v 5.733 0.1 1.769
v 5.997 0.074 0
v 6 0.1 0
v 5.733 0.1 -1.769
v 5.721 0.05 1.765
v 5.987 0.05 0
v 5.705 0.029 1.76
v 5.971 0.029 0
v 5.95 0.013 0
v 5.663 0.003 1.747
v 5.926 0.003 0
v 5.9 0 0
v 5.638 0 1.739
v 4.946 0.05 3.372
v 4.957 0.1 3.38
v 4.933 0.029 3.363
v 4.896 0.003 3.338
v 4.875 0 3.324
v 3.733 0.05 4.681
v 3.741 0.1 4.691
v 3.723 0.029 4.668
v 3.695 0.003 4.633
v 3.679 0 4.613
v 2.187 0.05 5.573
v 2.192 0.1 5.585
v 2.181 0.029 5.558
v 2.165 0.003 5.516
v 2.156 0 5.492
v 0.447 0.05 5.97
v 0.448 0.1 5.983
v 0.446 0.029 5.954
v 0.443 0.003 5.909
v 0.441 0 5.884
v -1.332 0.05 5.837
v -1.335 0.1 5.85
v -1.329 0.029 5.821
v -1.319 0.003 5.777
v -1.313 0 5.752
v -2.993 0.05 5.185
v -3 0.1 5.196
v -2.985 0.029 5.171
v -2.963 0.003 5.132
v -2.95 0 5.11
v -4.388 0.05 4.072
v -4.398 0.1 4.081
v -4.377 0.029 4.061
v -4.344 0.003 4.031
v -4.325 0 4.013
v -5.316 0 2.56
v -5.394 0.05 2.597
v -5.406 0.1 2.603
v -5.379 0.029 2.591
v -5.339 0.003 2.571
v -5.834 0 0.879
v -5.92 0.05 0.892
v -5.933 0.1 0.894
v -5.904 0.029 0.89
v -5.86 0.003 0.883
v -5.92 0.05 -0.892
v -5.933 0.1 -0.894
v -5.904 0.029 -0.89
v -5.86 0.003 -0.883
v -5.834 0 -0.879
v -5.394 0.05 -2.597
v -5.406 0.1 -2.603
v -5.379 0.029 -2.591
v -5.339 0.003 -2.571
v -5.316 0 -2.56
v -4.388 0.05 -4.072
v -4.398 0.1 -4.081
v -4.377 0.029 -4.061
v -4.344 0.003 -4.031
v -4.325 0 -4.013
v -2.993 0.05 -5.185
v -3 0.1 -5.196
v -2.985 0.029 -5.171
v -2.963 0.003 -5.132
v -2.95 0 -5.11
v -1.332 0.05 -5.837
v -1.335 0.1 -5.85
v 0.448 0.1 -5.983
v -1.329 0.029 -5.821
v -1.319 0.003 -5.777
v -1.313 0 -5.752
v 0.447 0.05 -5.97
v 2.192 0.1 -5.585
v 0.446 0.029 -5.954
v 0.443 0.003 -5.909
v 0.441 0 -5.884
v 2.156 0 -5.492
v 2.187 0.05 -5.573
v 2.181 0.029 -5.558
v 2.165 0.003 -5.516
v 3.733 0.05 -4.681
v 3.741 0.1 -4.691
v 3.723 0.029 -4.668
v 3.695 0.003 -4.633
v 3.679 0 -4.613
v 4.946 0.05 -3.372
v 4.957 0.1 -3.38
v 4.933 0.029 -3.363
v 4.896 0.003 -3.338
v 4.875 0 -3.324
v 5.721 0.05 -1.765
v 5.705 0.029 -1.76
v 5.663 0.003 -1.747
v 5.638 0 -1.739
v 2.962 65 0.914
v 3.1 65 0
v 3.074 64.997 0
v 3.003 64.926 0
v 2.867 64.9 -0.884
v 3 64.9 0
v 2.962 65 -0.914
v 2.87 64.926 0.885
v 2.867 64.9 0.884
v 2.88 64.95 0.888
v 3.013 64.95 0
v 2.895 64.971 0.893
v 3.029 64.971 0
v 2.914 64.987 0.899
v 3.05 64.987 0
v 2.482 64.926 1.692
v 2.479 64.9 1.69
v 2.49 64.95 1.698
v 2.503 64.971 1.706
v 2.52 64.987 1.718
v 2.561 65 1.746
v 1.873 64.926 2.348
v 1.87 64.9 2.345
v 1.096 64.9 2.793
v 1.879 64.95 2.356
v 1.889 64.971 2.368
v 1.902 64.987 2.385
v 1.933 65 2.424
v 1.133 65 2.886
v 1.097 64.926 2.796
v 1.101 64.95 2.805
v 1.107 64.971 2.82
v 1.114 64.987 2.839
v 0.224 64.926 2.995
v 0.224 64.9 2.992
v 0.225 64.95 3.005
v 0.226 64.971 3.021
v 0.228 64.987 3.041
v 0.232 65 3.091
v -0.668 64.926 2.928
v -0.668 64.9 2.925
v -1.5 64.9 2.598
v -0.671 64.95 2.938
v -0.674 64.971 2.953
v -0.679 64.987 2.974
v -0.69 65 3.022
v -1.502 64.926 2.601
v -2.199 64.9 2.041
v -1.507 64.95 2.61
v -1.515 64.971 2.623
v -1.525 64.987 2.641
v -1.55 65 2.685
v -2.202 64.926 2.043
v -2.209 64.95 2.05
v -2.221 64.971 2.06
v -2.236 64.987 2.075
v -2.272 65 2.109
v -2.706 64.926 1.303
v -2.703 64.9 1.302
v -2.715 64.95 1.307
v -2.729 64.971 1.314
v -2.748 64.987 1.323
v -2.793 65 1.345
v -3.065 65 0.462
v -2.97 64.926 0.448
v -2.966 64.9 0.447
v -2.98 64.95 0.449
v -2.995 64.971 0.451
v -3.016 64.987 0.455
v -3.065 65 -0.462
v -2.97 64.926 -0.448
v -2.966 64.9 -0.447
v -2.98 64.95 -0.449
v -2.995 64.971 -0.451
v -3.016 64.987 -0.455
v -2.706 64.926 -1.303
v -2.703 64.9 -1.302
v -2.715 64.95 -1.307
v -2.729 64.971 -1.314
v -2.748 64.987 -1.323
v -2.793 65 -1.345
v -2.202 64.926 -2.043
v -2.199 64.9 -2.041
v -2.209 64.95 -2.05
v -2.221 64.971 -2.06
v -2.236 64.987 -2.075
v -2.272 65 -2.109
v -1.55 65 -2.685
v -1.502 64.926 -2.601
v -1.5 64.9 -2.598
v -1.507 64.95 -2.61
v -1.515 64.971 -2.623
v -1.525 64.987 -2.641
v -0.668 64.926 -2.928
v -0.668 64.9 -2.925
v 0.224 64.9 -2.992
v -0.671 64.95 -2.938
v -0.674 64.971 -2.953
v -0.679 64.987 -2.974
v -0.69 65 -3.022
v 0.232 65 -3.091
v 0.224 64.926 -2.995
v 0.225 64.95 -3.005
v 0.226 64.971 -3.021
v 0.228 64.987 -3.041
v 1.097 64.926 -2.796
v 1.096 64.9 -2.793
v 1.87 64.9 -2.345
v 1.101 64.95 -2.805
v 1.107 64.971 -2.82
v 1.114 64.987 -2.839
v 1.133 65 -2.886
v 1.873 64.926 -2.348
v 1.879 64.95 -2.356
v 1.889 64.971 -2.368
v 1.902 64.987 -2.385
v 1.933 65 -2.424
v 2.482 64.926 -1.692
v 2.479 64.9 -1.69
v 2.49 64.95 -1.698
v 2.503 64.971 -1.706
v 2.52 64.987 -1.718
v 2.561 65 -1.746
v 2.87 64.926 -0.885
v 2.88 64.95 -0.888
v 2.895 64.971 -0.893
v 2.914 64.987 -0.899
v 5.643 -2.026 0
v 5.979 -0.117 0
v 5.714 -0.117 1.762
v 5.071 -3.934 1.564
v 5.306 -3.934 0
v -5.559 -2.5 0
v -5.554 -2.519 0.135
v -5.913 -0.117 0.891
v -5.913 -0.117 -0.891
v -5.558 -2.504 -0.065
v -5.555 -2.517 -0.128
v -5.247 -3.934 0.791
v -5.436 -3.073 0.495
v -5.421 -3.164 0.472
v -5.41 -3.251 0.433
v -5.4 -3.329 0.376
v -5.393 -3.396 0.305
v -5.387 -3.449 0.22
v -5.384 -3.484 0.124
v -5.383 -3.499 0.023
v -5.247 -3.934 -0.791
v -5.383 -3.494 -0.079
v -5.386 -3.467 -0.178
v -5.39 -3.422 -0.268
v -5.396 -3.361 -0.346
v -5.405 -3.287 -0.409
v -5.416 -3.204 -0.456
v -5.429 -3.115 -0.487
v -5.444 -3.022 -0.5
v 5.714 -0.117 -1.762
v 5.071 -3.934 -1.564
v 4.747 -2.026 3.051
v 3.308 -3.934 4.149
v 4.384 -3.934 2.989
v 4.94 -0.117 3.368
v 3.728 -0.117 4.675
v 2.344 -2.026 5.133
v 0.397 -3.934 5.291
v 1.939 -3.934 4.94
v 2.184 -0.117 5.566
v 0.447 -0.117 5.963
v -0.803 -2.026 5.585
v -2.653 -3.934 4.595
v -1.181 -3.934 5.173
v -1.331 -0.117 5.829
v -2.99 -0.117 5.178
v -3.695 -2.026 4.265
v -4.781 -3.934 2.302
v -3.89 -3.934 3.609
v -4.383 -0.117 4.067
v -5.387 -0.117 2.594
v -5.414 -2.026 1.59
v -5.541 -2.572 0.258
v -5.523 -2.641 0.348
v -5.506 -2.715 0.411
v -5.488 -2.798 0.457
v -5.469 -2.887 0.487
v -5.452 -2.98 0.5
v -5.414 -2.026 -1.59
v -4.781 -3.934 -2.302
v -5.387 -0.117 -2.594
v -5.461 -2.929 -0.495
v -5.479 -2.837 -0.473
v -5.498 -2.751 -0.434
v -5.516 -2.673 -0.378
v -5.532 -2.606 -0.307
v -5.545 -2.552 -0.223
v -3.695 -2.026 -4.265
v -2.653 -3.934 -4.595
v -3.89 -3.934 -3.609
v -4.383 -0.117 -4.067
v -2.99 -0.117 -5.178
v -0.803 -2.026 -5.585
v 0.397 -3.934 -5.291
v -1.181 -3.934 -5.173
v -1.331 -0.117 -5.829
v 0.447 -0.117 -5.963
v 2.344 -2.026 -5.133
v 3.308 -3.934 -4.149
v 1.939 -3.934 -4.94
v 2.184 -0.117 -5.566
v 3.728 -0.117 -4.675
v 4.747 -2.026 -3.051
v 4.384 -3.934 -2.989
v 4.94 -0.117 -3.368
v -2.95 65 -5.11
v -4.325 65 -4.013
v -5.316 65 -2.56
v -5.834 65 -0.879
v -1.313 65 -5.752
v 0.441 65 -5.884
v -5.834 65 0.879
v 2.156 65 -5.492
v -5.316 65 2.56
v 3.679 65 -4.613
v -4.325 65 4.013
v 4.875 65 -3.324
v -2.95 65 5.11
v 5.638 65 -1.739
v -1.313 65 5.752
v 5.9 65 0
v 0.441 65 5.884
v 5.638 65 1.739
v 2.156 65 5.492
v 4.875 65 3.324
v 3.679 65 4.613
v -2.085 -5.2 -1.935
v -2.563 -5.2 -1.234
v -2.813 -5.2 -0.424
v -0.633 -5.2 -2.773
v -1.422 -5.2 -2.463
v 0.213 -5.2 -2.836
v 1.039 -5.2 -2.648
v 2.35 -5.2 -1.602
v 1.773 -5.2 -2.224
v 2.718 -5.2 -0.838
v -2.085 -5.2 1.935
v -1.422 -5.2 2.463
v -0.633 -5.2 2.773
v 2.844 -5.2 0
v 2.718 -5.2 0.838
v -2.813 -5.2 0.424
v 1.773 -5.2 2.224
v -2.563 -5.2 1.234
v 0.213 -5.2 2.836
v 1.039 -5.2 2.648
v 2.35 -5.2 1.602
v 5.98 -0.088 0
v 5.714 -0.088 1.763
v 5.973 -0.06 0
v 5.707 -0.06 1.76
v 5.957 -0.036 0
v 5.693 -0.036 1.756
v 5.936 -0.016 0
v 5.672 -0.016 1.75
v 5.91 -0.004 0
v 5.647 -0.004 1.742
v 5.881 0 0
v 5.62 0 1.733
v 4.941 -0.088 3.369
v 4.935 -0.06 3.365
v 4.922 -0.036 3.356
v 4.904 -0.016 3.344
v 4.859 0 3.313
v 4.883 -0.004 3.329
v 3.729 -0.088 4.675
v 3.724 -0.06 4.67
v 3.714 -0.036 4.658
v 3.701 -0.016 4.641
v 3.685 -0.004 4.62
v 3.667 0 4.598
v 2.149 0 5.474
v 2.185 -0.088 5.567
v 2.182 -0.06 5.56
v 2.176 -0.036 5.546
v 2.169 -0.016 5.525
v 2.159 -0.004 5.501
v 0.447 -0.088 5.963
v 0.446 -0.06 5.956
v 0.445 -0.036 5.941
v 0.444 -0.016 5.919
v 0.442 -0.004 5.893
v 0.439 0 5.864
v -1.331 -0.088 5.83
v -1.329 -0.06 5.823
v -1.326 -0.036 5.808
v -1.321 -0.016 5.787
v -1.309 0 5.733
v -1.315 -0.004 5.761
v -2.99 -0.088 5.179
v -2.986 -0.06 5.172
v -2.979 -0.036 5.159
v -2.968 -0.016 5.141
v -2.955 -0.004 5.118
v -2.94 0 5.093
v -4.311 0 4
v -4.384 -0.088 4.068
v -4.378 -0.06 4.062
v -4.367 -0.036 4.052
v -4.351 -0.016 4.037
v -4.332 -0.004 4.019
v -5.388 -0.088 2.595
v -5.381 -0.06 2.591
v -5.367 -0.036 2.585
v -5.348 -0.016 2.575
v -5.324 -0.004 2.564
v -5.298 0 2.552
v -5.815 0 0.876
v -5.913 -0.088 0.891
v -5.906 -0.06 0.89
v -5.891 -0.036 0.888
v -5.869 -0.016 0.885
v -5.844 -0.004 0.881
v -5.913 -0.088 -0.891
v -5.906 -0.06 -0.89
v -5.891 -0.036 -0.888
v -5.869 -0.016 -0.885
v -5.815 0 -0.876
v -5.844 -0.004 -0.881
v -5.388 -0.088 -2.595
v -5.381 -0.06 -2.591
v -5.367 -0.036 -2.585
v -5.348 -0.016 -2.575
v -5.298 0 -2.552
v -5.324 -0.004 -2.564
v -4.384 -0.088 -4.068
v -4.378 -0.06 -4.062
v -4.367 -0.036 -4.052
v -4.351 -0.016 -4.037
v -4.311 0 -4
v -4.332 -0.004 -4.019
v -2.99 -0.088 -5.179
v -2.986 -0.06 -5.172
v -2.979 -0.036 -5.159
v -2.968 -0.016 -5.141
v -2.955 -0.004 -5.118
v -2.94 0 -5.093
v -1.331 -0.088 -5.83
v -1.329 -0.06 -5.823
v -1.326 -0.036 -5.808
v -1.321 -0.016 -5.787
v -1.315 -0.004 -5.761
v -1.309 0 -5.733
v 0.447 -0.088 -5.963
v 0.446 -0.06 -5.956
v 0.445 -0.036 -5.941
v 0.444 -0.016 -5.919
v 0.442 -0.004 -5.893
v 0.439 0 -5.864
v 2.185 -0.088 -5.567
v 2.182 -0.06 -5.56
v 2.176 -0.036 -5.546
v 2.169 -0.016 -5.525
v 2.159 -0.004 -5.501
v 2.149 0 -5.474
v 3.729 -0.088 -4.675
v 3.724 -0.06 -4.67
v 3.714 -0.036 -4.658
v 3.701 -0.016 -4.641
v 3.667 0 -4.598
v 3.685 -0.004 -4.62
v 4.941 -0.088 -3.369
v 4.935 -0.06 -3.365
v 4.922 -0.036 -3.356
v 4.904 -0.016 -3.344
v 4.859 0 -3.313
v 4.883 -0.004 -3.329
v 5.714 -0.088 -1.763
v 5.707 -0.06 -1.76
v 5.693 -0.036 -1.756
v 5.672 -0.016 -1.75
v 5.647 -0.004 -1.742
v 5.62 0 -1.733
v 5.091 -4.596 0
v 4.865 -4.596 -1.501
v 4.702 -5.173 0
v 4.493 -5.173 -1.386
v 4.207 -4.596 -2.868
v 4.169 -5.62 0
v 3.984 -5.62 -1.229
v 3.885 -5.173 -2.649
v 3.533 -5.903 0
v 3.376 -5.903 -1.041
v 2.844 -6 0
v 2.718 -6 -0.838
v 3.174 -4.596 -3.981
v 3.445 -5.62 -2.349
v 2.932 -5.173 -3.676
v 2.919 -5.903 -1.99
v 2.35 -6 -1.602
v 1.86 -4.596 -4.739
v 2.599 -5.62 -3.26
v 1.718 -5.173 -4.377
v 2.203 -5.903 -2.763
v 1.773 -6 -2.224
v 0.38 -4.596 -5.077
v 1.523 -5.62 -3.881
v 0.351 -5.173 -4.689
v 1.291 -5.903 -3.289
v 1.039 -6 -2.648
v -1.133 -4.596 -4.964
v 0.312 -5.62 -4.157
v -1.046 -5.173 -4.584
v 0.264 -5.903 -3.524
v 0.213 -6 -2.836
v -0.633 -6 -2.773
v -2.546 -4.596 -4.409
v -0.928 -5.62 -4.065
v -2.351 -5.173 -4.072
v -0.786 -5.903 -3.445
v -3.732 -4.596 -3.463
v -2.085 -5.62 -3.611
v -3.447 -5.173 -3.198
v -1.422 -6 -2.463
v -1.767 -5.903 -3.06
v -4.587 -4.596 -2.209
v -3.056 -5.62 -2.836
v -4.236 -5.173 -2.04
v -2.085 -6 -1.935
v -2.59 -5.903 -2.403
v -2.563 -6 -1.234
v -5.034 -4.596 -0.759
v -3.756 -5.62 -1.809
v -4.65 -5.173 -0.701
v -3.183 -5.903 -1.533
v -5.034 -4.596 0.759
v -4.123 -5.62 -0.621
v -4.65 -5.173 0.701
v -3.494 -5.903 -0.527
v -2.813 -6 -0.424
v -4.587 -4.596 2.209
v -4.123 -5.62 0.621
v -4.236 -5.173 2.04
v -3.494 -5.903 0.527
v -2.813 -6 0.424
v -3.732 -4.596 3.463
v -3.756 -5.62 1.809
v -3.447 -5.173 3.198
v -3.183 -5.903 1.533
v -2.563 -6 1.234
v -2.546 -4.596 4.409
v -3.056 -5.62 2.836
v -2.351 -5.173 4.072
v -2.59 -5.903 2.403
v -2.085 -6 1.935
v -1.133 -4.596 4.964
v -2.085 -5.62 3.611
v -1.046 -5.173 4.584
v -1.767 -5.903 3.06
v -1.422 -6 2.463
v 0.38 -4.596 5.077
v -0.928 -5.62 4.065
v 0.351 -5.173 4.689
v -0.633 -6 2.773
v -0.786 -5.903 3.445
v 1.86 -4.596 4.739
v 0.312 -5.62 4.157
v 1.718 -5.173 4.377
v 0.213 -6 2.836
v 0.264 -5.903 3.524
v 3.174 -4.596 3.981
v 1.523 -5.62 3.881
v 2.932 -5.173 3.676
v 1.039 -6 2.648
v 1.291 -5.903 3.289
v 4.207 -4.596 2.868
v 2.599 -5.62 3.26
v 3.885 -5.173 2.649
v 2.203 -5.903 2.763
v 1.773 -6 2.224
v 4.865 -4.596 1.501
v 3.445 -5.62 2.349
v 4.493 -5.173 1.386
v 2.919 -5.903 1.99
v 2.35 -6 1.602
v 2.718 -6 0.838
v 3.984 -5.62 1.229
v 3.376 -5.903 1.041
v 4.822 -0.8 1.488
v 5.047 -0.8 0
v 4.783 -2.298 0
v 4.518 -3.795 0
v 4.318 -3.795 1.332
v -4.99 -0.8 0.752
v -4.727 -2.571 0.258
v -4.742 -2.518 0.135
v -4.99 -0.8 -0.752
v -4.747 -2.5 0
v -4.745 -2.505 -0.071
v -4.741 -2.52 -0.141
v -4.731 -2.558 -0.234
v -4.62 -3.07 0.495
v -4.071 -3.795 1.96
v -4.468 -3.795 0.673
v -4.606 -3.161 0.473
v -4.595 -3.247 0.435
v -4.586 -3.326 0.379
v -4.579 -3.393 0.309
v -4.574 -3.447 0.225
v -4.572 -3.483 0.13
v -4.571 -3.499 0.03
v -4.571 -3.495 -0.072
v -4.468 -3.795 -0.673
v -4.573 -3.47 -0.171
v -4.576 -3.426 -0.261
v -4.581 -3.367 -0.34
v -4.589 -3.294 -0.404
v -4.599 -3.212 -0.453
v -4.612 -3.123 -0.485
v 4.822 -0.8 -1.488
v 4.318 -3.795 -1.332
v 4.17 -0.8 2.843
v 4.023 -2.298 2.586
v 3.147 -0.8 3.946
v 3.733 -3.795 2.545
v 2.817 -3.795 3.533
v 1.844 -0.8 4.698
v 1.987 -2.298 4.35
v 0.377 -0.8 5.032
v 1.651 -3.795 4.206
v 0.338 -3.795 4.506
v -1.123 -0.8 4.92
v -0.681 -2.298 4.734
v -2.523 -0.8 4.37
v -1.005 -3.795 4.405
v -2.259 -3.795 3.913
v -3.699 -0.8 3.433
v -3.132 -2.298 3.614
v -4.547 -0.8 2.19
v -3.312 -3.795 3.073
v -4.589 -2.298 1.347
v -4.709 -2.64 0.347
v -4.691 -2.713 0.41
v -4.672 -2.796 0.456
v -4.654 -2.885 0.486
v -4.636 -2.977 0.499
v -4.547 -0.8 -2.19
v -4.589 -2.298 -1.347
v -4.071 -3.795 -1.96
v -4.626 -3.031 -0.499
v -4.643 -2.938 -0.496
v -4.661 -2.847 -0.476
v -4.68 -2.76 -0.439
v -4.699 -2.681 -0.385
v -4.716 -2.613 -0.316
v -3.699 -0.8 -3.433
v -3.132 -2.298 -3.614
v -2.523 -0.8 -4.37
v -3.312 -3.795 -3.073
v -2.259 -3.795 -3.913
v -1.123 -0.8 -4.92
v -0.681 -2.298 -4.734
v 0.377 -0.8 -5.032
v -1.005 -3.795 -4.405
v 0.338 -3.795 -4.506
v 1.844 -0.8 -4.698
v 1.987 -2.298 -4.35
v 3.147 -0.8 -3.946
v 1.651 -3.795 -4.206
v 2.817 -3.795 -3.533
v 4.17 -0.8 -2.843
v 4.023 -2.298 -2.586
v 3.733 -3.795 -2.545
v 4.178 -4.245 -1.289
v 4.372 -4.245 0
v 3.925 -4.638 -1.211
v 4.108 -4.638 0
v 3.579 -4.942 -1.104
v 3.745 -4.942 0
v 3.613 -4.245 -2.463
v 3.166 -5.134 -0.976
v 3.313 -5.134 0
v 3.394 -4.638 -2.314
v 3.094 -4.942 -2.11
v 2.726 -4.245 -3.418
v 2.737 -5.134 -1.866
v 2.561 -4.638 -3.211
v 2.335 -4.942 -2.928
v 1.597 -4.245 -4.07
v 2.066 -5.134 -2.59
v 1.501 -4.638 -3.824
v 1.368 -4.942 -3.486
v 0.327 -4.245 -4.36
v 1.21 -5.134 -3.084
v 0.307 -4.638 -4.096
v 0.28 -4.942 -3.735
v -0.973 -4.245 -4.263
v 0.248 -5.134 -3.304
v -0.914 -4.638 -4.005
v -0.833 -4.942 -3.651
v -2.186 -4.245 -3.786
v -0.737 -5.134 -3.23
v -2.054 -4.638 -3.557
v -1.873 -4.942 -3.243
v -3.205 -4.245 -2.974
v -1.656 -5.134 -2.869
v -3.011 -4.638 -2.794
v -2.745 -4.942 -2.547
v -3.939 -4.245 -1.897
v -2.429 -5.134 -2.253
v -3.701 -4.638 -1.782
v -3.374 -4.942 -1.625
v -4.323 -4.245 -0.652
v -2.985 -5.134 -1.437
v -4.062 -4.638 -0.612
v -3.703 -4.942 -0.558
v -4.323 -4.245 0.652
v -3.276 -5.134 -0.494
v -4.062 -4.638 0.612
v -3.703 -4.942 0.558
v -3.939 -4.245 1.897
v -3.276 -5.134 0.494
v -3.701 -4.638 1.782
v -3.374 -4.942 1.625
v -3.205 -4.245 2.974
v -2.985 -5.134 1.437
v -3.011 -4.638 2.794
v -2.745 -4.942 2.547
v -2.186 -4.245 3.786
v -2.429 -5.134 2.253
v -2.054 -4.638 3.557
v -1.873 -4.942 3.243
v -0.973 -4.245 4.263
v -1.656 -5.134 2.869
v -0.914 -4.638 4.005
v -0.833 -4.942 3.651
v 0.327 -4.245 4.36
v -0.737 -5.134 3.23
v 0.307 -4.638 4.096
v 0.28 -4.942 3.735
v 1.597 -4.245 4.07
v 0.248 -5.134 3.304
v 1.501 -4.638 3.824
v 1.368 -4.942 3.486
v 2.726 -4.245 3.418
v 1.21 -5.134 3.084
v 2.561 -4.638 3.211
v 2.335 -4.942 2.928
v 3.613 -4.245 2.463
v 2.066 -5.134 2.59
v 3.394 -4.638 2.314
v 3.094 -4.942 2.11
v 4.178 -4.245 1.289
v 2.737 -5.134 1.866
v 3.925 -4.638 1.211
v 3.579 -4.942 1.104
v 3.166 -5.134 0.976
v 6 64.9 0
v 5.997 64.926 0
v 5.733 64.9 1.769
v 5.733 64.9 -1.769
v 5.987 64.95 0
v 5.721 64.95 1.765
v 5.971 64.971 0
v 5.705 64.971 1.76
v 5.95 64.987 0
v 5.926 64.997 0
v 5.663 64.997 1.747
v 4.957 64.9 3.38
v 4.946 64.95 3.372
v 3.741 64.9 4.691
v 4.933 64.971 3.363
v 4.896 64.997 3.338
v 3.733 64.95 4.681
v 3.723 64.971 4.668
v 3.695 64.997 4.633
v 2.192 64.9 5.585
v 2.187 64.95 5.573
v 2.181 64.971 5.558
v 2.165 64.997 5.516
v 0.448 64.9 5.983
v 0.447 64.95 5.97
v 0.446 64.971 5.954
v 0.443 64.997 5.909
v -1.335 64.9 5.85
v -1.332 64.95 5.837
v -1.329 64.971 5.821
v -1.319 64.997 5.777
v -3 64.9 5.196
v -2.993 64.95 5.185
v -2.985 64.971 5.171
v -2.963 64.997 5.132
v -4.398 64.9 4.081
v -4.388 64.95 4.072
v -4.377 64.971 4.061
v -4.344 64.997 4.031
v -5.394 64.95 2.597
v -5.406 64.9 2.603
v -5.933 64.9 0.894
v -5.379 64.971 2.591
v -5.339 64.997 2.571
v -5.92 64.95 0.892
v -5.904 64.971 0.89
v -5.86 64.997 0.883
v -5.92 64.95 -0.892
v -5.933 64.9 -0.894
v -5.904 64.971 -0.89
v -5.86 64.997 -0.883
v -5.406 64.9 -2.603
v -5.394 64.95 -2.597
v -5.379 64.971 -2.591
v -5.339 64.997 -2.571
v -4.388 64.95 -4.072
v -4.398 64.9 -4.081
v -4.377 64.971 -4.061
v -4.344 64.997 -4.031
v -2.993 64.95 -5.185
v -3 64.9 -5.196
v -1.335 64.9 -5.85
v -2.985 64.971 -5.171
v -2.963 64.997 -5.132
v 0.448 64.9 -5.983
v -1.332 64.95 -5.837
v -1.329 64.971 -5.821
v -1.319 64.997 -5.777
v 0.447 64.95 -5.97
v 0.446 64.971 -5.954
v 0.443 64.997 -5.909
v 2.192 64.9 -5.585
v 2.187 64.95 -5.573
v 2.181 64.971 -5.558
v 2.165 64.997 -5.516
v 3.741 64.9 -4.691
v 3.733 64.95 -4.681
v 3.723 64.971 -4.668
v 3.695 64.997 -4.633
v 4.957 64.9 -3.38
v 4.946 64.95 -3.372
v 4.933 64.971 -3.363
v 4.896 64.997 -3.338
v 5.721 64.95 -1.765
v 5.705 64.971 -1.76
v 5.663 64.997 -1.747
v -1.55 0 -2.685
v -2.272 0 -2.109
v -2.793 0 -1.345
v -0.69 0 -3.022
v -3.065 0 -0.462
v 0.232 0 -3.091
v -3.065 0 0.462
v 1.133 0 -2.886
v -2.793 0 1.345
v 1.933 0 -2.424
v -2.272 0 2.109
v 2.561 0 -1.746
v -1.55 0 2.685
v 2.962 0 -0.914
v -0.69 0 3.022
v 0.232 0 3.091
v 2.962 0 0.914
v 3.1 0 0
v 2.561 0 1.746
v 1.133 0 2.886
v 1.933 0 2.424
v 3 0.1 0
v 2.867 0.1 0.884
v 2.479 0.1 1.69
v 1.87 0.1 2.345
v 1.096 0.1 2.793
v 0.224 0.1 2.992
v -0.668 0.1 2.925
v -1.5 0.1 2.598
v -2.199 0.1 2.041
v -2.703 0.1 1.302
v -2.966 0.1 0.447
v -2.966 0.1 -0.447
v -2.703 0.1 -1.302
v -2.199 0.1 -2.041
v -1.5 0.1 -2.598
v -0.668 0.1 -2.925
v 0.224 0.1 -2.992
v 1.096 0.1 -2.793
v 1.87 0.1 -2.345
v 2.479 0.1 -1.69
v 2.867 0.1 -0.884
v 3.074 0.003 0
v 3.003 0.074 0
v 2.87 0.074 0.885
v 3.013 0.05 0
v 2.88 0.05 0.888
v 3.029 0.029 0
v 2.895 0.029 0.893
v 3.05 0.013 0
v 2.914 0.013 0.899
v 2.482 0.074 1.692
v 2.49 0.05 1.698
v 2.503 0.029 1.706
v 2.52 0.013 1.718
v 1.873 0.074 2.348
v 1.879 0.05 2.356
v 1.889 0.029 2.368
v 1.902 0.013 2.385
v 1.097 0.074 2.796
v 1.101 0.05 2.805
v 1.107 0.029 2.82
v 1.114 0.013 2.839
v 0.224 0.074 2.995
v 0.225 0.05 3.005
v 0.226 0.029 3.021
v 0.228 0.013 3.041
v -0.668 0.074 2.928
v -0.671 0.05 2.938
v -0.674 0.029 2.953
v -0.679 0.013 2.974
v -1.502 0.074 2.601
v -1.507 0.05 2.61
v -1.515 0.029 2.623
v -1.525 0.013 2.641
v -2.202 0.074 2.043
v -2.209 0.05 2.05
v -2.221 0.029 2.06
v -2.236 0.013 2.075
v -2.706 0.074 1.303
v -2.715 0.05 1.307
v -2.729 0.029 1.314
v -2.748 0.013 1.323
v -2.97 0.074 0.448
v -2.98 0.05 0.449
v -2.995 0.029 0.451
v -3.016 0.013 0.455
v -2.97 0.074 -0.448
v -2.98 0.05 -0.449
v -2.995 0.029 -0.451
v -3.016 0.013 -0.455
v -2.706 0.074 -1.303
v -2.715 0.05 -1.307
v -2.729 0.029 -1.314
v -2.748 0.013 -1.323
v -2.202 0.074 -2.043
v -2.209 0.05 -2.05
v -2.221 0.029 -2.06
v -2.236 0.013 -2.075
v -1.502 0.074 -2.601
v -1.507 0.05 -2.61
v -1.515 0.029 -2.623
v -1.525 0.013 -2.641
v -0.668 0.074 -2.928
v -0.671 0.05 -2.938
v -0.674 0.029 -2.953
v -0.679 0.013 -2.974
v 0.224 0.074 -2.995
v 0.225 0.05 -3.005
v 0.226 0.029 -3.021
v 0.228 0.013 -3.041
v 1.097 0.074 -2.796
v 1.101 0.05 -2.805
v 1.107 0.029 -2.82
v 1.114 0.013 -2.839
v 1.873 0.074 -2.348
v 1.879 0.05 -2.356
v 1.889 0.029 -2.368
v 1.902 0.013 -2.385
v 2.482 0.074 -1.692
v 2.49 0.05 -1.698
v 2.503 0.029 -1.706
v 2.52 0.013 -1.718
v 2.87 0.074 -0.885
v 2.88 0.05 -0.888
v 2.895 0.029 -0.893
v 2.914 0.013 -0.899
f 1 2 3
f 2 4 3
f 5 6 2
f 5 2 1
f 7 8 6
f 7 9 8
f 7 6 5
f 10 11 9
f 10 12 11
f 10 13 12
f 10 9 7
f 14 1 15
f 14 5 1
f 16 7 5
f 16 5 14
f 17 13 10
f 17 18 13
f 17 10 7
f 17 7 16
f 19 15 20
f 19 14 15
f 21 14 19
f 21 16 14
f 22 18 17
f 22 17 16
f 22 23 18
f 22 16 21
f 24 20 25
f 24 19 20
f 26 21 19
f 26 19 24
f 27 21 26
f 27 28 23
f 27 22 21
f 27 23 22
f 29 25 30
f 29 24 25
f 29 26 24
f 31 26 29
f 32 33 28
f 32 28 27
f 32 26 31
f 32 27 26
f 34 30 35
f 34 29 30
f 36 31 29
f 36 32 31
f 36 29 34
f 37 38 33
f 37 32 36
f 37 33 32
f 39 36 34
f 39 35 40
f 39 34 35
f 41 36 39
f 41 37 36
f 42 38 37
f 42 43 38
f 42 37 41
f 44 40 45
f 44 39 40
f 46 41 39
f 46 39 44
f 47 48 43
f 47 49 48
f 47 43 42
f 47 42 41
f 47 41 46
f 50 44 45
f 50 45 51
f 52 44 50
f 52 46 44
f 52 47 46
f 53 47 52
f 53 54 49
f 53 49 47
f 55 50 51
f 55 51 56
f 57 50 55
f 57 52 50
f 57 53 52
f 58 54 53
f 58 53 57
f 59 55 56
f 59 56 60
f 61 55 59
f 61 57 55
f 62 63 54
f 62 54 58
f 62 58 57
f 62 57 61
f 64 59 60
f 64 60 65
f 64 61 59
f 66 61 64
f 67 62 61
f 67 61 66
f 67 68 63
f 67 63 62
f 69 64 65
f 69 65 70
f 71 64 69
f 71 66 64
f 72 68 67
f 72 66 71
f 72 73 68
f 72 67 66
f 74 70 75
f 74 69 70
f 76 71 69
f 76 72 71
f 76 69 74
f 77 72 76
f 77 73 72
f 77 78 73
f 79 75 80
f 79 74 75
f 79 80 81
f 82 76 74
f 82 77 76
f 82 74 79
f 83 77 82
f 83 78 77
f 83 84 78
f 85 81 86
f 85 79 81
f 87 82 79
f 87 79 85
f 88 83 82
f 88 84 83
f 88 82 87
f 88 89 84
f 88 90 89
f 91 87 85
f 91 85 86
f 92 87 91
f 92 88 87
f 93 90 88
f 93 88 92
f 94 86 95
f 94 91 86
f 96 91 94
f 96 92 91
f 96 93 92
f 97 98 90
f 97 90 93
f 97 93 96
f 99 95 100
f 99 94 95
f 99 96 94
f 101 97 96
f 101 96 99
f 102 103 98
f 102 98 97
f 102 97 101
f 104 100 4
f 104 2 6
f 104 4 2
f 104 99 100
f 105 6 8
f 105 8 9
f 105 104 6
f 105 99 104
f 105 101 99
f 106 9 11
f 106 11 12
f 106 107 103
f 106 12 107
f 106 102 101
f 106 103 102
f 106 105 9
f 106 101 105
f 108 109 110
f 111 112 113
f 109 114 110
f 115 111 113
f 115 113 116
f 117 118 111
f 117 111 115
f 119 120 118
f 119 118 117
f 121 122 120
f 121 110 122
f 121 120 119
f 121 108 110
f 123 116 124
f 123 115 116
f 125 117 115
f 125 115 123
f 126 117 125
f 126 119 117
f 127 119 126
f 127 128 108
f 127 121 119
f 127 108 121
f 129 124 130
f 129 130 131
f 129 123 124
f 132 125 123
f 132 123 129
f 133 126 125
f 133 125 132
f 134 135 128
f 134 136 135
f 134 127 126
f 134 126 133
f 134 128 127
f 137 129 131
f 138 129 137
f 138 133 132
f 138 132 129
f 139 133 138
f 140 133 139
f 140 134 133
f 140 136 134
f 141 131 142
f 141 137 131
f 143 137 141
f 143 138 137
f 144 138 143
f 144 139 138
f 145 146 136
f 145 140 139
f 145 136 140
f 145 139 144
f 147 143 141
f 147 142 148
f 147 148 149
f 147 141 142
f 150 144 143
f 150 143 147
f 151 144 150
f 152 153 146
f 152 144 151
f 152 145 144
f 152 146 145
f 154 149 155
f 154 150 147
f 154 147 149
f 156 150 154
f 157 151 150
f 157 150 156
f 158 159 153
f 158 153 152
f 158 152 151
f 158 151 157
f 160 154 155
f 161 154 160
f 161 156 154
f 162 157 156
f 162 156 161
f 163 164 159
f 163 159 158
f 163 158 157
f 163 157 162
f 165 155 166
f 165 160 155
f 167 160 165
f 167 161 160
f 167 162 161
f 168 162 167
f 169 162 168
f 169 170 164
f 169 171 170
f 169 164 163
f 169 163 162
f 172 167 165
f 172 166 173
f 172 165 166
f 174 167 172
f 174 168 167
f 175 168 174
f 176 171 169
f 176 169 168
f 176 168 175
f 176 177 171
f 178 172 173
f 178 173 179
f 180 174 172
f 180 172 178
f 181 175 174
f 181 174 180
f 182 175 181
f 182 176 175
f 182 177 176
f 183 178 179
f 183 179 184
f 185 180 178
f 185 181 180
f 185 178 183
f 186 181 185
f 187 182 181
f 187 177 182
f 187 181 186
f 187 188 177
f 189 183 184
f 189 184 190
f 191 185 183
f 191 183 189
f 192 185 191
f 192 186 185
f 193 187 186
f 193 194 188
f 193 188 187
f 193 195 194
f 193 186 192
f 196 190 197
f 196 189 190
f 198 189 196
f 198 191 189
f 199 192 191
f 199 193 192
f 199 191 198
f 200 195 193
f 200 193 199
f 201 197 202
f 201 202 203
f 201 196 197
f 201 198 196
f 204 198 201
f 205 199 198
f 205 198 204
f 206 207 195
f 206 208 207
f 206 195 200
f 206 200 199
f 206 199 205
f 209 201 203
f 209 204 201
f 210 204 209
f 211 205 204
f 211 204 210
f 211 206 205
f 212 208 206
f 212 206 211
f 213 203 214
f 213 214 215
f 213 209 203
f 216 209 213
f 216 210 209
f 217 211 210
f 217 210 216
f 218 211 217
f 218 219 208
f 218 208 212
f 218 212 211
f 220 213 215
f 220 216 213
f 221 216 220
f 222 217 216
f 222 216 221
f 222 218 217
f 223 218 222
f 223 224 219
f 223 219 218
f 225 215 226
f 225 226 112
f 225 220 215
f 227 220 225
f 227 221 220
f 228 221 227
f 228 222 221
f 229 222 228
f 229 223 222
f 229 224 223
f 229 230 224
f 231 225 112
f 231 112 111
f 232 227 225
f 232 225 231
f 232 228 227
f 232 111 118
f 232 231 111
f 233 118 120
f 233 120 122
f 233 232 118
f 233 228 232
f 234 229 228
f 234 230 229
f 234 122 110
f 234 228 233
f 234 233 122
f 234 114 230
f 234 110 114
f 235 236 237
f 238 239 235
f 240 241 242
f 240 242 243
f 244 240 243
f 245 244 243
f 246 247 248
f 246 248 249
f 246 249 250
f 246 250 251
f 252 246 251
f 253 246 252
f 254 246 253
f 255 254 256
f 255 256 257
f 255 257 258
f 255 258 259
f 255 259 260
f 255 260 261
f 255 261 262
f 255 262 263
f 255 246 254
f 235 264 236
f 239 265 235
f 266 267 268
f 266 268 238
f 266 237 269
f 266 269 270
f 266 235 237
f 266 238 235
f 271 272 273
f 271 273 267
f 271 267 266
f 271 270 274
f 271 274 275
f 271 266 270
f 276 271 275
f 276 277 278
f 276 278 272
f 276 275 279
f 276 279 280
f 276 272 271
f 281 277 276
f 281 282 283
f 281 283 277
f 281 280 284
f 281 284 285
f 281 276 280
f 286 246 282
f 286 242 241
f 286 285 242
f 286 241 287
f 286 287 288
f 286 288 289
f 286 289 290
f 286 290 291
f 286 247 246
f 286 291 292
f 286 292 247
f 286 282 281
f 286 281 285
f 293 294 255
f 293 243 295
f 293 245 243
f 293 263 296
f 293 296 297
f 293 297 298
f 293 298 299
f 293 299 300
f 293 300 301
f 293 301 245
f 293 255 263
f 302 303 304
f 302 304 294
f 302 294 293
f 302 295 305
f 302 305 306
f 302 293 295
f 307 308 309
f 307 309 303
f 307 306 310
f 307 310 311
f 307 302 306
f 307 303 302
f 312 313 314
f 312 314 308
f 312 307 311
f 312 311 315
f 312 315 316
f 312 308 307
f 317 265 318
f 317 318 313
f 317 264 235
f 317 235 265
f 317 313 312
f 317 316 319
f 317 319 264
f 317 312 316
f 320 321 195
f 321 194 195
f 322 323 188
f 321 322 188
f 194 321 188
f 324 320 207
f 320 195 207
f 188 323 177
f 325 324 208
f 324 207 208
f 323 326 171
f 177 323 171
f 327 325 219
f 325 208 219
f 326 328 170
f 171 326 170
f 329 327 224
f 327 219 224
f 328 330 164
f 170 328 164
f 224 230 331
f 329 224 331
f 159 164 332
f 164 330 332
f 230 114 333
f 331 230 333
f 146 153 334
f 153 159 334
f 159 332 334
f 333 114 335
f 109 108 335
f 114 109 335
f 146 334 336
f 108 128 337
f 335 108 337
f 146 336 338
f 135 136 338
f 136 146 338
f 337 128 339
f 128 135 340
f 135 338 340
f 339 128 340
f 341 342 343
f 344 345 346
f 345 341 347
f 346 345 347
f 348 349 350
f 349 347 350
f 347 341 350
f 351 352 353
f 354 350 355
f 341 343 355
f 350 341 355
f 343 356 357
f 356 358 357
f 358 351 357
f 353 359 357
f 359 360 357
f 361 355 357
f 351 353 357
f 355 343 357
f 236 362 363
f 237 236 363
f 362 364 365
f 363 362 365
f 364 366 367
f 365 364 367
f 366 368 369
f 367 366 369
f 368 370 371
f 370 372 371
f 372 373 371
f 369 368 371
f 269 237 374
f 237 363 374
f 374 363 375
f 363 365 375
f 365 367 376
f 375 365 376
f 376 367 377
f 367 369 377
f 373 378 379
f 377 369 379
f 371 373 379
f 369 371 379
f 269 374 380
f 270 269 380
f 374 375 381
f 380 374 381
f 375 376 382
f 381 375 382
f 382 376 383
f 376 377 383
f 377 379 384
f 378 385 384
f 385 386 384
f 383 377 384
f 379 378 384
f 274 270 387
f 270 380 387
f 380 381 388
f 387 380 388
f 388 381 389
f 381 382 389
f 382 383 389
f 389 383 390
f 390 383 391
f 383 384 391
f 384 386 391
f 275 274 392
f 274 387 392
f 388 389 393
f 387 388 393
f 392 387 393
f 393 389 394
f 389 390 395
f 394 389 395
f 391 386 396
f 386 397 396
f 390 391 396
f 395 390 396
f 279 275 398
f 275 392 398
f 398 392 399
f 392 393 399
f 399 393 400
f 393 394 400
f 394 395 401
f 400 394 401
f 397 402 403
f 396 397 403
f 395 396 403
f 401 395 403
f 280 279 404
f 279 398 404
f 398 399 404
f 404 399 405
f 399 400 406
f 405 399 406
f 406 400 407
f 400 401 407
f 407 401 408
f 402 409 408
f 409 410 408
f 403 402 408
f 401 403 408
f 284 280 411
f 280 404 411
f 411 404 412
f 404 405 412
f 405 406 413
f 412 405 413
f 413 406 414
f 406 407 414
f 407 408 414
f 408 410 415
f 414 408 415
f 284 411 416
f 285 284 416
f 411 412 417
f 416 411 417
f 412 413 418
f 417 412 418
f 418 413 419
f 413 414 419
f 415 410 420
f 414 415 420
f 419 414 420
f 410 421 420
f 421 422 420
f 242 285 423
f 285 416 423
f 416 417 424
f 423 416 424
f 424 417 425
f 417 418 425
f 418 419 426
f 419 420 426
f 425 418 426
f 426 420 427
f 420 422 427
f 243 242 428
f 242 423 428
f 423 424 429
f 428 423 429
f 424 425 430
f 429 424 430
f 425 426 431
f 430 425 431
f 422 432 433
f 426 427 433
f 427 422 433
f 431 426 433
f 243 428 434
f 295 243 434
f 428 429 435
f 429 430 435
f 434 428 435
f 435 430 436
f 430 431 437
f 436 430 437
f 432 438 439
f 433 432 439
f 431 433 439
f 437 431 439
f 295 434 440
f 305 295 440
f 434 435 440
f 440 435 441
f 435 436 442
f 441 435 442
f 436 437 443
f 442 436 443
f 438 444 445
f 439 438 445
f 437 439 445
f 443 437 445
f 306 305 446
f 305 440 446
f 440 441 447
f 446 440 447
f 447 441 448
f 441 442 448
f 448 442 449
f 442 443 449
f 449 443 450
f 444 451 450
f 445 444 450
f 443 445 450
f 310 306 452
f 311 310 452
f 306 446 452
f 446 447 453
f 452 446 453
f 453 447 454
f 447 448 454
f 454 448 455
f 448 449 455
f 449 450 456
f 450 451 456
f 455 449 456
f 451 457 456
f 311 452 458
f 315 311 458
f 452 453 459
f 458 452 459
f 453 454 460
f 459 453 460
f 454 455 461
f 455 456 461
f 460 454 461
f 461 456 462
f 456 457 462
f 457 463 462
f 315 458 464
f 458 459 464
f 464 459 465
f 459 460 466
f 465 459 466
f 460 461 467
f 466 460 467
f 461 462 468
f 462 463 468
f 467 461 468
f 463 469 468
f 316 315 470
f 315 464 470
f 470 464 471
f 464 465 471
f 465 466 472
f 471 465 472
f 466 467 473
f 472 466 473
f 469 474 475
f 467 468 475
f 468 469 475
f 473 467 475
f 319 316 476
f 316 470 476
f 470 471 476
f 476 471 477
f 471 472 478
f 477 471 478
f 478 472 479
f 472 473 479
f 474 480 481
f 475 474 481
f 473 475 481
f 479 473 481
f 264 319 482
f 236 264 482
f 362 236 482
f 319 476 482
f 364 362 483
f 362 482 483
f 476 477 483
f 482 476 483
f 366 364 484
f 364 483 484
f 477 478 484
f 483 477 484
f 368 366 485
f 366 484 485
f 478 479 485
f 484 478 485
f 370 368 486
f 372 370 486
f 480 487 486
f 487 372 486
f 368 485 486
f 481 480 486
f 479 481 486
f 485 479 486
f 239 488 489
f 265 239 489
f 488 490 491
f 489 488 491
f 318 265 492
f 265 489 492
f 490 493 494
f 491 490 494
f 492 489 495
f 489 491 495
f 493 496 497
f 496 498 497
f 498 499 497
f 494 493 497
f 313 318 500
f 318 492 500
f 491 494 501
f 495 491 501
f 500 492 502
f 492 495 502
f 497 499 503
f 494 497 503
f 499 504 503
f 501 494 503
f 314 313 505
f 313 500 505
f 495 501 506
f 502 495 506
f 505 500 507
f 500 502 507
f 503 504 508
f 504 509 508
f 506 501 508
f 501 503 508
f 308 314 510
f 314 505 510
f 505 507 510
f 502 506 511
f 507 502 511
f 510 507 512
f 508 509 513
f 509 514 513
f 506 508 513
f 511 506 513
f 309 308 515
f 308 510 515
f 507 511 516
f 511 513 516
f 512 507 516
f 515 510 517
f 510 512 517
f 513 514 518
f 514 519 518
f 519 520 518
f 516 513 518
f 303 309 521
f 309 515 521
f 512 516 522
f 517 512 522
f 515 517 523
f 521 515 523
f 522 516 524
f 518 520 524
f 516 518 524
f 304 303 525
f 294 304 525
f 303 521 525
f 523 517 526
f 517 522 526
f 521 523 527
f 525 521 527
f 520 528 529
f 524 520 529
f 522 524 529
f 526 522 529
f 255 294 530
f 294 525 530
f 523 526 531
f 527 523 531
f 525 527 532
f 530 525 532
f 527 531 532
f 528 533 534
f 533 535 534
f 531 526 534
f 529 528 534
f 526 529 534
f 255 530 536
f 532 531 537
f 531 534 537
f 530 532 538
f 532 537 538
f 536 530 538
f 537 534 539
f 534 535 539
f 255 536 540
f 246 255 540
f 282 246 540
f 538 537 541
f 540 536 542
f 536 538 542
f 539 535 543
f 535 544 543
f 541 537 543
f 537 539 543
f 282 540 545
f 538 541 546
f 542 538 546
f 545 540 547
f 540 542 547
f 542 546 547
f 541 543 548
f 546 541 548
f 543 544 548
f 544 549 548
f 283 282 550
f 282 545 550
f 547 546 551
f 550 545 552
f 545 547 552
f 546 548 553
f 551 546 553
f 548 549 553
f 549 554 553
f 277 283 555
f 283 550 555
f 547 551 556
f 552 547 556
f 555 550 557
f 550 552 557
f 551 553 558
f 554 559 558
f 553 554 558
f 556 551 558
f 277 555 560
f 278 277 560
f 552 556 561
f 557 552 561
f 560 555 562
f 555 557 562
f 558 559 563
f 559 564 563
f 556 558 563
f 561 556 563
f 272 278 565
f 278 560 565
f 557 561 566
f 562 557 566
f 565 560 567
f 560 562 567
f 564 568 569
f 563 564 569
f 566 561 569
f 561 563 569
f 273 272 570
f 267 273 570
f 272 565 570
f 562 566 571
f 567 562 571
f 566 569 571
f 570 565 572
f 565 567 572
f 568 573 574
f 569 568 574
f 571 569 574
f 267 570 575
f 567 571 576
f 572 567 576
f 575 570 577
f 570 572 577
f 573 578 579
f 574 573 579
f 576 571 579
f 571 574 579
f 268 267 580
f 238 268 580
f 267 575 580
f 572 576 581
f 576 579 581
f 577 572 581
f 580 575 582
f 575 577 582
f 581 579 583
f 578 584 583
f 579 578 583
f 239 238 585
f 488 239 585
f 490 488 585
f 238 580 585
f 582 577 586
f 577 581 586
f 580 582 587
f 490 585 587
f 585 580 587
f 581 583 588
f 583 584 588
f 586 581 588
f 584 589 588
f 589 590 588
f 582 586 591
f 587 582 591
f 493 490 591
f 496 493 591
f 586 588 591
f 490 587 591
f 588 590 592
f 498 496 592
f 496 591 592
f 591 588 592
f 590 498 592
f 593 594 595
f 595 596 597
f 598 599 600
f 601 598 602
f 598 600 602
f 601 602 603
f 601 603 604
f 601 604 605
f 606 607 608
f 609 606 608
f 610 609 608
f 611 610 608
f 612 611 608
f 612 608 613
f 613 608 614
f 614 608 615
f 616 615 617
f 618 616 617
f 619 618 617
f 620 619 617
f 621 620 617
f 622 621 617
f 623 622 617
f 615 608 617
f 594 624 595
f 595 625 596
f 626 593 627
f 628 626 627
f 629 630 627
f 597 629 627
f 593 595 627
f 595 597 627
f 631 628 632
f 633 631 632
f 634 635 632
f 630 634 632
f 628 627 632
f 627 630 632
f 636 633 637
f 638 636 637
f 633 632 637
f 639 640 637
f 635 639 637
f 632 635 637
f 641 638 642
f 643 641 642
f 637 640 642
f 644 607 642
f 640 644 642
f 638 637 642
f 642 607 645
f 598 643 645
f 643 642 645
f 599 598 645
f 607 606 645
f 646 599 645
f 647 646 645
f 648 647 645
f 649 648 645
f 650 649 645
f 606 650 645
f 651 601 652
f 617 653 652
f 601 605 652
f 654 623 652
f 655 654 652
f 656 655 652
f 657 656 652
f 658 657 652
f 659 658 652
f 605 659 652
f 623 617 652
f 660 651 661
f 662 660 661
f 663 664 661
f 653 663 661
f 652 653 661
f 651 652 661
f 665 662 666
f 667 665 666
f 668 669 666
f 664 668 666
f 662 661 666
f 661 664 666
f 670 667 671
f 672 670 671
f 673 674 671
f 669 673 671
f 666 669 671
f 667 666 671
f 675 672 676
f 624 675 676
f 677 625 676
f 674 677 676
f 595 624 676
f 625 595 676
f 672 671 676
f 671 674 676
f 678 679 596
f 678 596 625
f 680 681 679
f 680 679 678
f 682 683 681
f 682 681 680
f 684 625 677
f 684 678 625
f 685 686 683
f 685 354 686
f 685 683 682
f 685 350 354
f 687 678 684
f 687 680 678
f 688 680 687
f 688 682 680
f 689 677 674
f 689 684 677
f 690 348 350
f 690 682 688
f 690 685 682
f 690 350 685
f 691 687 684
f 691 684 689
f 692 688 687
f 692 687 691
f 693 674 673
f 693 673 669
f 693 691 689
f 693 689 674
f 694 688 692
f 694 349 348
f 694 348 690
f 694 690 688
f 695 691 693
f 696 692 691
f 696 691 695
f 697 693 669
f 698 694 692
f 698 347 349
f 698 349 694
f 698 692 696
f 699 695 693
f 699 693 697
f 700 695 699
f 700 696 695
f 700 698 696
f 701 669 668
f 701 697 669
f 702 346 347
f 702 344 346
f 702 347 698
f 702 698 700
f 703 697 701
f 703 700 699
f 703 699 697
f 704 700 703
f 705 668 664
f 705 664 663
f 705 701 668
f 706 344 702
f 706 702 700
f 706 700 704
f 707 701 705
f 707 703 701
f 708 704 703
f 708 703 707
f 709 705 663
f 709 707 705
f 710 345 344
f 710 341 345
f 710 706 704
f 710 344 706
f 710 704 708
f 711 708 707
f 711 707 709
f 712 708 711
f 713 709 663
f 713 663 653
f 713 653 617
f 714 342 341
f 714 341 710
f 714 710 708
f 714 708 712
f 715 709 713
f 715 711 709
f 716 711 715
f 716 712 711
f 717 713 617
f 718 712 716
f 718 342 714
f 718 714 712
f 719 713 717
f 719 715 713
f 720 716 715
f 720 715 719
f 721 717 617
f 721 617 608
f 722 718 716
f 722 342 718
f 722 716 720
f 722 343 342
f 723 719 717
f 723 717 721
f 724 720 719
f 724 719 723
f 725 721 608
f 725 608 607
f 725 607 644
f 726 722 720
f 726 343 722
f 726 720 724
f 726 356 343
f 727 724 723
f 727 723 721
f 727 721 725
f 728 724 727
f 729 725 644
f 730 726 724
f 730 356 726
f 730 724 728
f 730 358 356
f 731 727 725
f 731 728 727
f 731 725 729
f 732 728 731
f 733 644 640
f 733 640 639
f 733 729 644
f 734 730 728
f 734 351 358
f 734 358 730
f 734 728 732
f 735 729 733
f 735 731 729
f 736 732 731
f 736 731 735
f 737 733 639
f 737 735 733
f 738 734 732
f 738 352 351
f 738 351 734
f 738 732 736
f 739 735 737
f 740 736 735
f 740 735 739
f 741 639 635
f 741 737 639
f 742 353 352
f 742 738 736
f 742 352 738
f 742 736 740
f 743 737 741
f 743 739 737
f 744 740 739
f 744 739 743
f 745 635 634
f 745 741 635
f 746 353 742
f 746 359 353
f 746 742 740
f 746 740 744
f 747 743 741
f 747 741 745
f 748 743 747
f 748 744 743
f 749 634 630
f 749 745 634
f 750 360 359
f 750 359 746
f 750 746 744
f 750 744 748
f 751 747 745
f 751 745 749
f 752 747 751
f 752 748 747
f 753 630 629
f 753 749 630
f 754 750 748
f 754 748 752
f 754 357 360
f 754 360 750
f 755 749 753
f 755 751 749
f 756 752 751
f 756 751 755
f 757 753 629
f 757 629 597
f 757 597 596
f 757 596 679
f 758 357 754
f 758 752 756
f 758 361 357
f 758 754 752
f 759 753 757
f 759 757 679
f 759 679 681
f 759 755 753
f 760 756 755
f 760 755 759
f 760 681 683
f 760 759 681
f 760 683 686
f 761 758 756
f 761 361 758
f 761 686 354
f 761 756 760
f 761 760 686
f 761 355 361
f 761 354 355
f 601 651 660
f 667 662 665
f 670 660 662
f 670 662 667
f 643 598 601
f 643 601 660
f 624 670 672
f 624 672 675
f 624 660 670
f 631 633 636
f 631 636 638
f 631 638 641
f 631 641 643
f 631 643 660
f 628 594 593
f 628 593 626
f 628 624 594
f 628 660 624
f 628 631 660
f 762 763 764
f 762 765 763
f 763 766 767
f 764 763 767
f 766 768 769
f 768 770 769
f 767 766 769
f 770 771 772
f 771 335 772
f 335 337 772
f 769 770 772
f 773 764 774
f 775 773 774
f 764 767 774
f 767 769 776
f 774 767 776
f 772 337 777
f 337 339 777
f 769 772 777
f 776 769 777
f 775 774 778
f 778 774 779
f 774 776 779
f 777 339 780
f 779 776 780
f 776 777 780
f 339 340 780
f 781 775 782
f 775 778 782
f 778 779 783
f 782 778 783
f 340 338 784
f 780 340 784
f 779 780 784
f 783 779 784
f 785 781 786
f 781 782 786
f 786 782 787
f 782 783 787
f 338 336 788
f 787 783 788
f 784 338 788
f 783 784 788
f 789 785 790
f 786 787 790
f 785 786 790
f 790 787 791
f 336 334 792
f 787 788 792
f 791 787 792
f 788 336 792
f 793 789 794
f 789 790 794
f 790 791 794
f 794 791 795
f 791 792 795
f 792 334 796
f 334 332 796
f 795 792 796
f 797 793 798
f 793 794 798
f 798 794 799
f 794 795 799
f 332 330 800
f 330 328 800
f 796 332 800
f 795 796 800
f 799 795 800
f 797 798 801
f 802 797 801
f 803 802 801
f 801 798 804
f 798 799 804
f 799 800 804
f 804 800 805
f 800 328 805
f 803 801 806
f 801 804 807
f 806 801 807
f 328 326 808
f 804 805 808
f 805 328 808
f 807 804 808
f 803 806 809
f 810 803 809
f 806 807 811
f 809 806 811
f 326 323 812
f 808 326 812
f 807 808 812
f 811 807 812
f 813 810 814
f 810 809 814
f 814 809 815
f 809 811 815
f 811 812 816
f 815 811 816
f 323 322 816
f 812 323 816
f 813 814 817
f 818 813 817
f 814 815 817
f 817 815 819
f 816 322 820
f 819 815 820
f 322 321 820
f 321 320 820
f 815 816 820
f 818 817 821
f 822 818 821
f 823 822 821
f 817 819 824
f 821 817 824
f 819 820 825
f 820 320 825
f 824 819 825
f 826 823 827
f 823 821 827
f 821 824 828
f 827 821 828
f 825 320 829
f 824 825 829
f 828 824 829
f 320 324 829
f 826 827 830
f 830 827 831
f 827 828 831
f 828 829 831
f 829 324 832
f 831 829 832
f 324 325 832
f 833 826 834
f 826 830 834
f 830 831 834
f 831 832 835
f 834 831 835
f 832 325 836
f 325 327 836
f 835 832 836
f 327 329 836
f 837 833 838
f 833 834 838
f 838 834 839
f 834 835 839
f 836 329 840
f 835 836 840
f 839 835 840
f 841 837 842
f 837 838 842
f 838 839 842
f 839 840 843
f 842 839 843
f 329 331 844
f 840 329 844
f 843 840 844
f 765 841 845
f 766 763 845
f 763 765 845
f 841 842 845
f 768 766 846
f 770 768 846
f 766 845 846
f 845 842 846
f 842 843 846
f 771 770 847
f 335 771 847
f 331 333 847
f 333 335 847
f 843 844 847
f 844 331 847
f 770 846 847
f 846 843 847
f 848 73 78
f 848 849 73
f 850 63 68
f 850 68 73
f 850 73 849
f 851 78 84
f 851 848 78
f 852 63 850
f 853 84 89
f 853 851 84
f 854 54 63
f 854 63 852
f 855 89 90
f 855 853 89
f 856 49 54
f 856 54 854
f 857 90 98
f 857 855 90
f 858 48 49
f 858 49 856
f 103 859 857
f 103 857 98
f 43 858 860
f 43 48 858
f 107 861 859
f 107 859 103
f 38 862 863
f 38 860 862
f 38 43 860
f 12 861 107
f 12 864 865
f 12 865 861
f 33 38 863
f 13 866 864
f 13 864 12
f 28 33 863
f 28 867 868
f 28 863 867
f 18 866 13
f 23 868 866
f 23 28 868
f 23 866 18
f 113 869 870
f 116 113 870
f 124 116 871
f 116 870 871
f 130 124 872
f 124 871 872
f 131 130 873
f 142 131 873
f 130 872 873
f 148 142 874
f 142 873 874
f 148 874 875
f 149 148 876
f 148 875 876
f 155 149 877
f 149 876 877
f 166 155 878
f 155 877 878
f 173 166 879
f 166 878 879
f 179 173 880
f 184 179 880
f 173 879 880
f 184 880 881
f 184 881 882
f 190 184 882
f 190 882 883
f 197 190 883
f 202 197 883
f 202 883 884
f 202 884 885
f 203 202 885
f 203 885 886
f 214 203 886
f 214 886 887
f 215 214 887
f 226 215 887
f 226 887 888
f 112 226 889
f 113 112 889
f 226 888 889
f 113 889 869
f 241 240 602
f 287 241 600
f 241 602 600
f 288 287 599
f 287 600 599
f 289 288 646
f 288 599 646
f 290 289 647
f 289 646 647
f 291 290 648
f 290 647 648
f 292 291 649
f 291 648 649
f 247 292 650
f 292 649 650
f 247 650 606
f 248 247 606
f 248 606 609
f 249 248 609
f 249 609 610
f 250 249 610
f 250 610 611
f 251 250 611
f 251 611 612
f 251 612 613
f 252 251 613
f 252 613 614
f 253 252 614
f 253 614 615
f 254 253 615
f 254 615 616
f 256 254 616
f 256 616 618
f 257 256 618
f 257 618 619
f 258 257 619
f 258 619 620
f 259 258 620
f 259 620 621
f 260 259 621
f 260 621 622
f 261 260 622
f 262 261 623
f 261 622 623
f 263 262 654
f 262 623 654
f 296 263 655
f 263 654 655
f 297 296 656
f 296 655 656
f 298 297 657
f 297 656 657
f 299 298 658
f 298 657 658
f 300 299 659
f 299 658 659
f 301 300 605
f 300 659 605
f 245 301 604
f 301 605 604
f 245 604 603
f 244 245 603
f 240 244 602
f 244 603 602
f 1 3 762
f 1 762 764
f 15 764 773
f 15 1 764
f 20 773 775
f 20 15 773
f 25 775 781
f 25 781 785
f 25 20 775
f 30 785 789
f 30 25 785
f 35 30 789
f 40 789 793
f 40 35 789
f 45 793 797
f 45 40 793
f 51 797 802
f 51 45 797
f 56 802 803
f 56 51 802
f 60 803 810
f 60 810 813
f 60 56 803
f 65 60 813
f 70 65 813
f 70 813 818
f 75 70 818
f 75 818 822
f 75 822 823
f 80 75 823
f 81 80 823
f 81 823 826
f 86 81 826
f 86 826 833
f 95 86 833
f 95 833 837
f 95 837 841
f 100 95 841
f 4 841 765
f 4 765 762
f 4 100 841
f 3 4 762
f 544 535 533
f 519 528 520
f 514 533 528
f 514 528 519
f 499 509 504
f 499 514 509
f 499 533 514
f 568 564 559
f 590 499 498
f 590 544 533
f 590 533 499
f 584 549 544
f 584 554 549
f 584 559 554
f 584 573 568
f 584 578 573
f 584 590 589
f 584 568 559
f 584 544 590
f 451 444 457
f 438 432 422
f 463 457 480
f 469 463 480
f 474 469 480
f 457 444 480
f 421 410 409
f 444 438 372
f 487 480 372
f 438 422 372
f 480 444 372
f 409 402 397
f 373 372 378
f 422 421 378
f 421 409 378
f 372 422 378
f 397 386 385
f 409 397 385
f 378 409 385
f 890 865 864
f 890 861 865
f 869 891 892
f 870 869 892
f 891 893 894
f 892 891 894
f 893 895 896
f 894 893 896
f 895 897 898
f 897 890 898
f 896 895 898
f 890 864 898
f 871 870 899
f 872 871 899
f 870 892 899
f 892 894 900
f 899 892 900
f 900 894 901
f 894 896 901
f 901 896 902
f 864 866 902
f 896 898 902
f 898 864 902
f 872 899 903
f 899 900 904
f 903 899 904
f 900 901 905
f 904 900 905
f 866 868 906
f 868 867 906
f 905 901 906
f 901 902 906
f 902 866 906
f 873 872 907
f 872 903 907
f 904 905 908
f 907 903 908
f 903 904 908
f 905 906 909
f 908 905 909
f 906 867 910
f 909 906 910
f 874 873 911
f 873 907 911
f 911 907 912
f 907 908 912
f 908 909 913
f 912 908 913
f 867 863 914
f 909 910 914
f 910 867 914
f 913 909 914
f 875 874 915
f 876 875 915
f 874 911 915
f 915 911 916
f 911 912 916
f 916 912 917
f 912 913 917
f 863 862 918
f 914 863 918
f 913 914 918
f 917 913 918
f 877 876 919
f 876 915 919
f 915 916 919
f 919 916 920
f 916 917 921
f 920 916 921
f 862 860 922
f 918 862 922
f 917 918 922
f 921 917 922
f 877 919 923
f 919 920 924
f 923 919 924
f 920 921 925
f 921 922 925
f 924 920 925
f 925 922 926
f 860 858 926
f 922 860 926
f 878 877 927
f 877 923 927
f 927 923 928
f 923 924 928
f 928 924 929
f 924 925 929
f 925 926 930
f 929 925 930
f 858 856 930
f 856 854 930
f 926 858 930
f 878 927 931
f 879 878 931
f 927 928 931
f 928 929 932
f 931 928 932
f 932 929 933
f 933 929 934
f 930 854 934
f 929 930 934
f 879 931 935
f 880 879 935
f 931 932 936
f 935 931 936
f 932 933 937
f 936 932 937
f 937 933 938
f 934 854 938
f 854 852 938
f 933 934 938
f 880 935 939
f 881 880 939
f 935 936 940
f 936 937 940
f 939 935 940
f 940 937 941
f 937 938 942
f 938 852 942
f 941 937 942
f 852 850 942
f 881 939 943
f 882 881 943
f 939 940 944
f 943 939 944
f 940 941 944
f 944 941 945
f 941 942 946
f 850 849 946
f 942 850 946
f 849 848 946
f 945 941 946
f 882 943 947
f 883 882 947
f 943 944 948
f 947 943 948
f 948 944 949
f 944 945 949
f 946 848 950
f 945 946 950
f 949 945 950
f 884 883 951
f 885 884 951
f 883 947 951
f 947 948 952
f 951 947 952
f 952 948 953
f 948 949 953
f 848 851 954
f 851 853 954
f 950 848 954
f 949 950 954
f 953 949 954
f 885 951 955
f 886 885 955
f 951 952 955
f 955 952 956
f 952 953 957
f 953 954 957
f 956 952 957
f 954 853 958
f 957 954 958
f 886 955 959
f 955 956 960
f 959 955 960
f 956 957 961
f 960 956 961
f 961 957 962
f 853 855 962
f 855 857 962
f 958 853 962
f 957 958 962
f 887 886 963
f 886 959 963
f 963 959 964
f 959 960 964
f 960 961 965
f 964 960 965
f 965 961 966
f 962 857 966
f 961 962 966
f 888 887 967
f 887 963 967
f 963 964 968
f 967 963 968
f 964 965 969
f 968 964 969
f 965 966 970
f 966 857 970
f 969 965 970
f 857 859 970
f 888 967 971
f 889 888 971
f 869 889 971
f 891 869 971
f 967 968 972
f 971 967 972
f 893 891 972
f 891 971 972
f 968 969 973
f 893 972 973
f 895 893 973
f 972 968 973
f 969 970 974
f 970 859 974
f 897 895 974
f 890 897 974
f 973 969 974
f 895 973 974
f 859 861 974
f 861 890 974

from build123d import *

# Parameters (mm, degrees)
F0_R     = 6
F0_R_2   = 3
F1_DEPTH = 65
F2_DEPTH = 6
F2_TAPER = 10
F3_R     = 2.5
F4_T     = -0.8
F5_R     = 0.5
F6_DEPTH = 6.5591826482
F7_R     = 0.1
F7_2_R   = 0.1


with BuildPart() as f1:
    # F0 (on Front) → F1 (new body)
    with BuildSketch(Plane.XZ):
        Circle(F0_R)
        Circle(F0_R_2, mode=Mode.SUBTRACT)
    extrude(amount=-F1_DEPTH)

    # F7
    f7_edges = [f1.edges().sort_by_distance(p)[0] for p in [
        (6, 32.5, 0),
        (-6, 0, 0),
        (-6, 65, 0),
        (3, 32.5, 0),
        (-3, 0, 0),
        (-3, 65, 0),
    ]]
    fillet(f7_edges, radius=F7_R)


with BuildPart() as f2:
    # F0 (on Front) → F2 (new body)
    with BuildSketch(Plane.XZ):
        Circle(F0_R)
        Circle(F0_R_2, mode=Mode.SUBTRACT)
        Circle(F0_R_2)
    extrude(amount=F2_DEPTH, taper=F2_TAPER)

    # F3
    f3_edges = [f2.edges().sort_by_distance(p)[0] for p in [
        (-4.942038, -6, 0),
    ]]
    fillet(f3_edges, radius=F3_R)

    # F4 (hollow: no face is removed)
    offset(amount=F4_T, mode=Mode.SUBTRACT)

    # F5 (on Right) → F6 (cut, up to face)
    with BuildSketch(Plane.YZ):
        with Locations((-3, 0)):
            Circle(F5_R)
    extrude(amount=-F6_DEPTH, mode=Mode.SUBTRACT)

    # F7#2
    f7_2_edges = [f2.edges().sort_by_distance(p)[0] for p in [
        (-6, 0, 0),
    ]]
    fillet(f7_2_edges, radius=F7_2_R)


solid = Compound([f1.part, f2.part])
